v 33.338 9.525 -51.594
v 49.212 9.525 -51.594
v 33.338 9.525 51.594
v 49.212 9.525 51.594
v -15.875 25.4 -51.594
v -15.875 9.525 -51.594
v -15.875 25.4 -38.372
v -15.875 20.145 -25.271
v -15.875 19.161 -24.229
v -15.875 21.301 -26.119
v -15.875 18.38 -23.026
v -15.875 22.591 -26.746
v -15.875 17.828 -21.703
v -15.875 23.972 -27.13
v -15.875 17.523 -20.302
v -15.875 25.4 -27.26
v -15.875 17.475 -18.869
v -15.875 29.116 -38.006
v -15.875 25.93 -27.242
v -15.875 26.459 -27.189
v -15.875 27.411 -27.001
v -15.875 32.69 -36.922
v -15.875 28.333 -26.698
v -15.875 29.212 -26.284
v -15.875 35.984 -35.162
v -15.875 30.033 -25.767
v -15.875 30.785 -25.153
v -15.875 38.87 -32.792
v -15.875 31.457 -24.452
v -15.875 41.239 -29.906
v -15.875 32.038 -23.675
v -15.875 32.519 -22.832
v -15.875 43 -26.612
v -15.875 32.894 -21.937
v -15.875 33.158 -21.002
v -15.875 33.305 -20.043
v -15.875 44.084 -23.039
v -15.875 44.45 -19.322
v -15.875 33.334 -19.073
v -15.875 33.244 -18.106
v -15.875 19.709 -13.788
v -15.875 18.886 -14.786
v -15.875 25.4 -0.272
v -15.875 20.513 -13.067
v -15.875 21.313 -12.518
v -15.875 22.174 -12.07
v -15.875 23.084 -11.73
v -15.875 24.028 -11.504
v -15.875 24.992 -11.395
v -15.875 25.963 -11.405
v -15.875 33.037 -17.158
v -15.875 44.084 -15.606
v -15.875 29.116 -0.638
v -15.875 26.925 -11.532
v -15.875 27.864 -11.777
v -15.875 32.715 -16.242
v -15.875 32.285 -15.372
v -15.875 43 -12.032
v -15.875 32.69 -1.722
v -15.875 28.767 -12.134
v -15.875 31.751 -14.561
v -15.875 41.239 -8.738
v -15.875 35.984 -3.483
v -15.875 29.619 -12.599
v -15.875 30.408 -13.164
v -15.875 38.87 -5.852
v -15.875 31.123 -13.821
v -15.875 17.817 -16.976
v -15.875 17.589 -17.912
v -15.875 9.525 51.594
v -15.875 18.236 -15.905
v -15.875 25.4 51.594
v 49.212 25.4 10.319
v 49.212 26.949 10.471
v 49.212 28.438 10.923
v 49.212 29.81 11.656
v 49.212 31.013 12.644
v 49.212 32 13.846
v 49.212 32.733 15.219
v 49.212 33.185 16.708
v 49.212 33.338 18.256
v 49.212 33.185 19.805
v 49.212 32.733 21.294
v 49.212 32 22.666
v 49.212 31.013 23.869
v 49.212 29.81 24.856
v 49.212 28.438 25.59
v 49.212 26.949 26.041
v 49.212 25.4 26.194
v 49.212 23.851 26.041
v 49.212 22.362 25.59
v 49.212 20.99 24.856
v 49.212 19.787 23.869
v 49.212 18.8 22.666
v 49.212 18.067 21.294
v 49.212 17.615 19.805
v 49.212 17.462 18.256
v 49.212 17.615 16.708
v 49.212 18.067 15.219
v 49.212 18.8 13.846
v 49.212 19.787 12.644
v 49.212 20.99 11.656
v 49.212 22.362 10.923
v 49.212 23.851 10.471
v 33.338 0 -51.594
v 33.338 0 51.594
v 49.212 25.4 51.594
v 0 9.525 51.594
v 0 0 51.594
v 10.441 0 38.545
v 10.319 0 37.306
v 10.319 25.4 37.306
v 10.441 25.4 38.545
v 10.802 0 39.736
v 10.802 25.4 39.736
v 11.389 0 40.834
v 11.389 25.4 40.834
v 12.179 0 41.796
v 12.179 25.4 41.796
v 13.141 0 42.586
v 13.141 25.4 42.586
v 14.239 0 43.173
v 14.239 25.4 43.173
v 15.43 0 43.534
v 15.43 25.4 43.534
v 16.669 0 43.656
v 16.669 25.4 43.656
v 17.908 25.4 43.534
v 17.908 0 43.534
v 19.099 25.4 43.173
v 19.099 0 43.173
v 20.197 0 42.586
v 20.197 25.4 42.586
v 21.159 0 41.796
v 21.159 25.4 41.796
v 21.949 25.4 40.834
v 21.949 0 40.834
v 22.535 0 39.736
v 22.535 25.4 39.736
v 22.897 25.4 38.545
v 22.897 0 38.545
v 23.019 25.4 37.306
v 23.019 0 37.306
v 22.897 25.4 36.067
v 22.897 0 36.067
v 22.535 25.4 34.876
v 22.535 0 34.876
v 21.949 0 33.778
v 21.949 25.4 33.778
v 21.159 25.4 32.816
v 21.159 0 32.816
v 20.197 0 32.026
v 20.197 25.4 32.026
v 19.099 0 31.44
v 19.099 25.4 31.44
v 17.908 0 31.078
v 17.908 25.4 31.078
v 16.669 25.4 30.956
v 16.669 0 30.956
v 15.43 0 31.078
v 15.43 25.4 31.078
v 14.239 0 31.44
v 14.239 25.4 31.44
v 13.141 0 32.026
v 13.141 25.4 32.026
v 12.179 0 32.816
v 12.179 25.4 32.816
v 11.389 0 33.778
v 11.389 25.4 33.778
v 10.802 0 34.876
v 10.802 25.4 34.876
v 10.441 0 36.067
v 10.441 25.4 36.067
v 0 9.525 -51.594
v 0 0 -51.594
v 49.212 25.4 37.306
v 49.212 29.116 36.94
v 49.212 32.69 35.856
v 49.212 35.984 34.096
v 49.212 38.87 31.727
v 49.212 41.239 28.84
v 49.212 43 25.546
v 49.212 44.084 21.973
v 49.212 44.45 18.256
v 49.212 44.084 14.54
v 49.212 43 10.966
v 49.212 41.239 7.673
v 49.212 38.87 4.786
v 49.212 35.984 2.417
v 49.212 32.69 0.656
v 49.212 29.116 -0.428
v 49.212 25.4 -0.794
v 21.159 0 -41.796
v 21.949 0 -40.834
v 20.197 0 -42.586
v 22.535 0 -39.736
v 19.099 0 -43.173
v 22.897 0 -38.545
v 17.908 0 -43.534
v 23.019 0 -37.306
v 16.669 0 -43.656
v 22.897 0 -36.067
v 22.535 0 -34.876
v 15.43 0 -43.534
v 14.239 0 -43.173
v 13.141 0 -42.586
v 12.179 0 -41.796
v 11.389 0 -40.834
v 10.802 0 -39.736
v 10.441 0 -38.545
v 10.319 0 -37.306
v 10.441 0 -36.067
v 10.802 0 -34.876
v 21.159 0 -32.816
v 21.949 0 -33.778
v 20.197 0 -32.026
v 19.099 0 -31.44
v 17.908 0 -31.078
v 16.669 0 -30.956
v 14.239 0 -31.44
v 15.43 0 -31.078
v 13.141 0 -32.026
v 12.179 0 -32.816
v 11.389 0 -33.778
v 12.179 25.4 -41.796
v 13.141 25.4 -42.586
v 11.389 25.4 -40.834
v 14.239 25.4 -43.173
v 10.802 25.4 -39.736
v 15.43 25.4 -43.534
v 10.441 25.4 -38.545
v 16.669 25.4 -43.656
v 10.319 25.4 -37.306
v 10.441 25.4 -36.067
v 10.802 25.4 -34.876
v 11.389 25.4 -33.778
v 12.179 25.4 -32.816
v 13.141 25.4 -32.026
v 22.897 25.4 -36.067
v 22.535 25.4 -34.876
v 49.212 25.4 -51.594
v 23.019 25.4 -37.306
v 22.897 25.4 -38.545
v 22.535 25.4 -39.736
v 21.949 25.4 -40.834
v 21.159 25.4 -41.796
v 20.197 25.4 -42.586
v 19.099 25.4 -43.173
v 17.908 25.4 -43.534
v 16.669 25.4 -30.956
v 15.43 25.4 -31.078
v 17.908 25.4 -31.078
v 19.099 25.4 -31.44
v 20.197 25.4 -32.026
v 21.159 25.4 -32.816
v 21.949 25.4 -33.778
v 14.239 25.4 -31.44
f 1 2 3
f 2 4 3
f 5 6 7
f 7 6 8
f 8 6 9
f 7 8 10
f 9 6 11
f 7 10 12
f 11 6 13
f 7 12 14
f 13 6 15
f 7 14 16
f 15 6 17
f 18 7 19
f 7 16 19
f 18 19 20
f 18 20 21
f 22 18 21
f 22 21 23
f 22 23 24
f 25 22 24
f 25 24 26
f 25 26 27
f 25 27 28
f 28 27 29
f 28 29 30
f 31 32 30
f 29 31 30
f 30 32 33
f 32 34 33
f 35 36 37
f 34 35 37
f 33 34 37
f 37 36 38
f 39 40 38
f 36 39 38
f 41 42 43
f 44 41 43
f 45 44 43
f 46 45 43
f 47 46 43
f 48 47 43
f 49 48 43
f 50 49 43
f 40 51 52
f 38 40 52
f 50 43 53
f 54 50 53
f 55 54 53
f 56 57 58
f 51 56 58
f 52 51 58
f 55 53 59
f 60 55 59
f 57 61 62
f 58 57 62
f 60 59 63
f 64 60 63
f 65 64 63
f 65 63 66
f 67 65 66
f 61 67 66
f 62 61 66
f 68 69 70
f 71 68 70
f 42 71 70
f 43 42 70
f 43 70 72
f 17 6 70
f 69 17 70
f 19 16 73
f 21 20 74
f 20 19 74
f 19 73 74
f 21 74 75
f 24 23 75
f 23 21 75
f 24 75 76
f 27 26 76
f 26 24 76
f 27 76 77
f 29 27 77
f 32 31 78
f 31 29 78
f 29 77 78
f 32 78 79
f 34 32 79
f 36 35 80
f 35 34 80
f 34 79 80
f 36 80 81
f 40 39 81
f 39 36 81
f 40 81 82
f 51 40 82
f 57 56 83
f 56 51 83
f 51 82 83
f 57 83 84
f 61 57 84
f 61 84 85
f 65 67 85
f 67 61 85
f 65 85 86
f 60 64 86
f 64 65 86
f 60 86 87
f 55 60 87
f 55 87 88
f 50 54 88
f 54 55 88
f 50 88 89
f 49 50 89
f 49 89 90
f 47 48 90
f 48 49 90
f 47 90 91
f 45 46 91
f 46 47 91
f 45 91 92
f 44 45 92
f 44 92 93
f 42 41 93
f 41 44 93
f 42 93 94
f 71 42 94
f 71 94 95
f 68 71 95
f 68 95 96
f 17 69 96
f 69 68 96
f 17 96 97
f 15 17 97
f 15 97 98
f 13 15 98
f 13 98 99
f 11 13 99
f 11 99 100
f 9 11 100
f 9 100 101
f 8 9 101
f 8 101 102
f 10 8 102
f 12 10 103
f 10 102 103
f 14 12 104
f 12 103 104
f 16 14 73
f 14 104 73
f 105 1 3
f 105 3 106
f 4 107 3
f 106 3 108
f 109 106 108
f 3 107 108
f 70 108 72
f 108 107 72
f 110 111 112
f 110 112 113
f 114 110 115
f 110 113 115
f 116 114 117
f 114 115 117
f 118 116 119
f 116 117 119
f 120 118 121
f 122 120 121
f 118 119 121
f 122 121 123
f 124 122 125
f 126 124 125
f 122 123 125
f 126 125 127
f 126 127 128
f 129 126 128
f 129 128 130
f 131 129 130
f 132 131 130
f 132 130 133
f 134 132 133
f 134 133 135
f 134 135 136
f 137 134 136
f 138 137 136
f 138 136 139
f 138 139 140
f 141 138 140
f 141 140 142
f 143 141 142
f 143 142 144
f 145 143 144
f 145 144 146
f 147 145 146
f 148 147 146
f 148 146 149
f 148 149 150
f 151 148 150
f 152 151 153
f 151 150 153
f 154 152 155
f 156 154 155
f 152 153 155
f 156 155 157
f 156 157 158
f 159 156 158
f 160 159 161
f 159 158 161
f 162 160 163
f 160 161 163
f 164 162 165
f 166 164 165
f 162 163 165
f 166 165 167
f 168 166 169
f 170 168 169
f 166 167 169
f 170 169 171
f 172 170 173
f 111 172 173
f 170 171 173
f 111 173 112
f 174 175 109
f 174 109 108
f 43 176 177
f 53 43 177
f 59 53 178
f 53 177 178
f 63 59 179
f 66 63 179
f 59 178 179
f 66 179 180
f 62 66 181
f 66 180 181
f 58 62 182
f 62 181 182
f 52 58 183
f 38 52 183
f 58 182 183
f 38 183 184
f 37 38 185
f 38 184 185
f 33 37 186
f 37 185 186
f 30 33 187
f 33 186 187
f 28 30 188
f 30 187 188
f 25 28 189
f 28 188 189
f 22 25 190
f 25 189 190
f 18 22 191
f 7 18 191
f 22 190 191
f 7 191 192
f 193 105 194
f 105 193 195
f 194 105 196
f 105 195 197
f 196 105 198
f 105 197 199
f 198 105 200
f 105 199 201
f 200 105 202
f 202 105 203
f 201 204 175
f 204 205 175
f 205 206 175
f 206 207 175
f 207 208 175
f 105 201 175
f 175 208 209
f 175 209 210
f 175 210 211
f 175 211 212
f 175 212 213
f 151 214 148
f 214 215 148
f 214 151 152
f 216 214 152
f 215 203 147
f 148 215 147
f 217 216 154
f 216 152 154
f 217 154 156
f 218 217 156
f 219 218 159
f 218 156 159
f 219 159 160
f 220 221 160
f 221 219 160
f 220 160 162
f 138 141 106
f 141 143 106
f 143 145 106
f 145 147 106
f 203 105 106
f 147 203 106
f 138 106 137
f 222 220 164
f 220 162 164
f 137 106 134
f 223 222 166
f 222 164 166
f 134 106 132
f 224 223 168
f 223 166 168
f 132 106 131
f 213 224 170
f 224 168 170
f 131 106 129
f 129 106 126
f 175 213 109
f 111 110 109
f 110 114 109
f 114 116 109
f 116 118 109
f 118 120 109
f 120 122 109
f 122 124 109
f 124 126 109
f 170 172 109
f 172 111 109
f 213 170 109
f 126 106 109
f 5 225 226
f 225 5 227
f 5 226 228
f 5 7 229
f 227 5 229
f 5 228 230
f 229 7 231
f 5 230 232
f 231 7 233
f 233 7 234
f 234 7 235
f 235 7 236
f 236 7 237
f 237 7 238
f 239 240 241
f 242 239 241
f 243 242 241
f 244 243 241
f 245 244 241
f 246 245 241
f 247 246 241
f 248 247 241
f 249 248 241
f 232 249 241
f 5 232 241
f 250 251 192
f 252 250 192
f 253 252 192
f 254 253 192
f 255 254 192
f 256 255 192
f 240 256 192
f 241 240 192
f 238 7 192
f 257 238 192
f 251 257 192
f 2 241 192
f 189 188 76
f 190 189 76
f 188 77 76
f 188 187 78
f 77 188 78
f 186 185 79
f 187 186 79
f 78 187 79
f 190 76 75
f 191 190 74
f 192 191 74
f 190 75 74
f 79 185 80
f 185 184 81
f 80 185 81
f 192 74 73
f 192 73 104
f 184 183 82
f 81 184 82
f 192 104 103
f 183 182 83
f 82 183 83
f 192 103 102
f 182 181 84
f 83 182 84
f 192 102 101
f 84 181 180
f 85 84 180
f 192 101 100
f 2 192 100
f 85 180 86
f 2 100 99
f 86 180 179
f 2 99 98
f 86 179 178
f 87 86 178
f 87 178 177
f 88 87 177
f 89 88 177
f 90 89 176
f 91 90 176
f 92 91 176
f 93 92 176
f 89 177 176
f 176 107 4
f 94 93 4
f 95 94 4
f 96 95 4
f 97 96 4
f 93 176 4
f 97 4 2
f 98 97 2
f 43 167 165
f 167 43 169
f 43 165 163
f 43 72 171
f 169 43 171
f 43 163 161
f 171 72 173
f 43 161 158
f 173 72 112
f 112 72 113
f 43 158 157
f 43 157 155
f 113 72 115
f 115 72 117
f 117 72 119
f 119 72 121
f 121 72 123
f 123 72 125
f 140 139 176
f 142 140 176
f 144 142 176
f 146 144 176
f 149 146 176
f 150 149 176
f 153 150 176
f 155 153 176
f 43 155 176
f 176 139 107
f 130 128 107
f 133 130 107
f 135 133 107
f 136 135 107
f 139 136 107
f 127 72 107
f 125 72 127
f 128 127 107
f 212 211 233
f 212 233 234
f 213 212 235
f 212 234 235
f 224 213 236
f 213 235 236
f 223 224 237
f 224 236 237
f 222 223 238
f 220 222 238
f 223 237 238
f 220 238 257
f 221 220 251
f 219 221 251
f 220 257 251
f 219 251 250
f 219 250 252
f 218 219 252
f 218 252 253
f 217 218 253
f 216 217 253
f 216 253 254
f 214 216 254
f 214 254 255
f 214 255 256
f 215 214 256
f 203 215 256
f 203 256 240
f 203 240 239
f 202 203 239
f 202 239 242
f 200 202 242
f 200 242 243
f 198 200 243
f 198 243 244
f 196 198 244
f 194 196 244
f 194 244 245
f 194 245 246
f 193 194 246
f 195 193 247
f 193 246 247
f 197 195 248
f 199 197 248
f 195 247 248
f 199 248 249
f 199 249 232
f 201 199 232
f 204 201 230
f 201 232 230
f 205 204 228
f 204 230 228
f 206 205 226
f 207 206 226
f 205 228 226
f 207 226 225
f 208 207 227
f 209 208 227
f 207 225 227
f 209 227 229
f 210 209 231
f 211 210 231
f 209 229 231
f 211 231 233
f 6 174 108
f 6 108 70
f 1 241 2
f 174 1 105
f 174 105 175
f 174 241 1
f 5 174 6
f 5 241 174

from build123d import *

# Parameters (mm, degrees)
BOSS_EXTRUDE1_DEPTH = 51.59375
BOSS_EXTRUDE2_DEPTH = 75.156571292
SKETCH5_R           = 7.9375
CUT_EXTRUDE1_DEPTH  = 109.930311747
SKETCH6_R           = 6.35
CUT_EXTRUDE2_DEPTH  = 76.68979598


with BuildPart() as part:
    # Sketch2 → Boss-Extrude1 (new, symmetric)
    with BuildSketch(Plane.XY):
        Polygon((0, 9.525), (-15.875, 9.525), (-15.875, 25.4), (49.2125, 25.4), (49.2125, 9.525), (33.3375, 9.525), (33.3375, 0), (0, 0), align=None)
    extrude(amount=BOSS_EXTRUDE1_DEPTH, both=True)

    # Sketch3 → Boss-Extrude2 (add, along a direction that is not the sketch's normal)
    with BuildSketch(Plane(origin=(49.2125, 0, 0), x_dir=(0, 0, -1), z_dir=(1, 0, 0))):
        with BuildLine():
            Line((0.79375, 25.4), (-37.30625, 25.4))
            ThreePointArc((-37.30625, 25.4), (-18.25625, 44.45), (0.79375, 25.4))
        make_face()
    extrude(amount=-BOSS_EXTRUDE2_DEPTH, dir=(0.86602540378444, 0, 0.49999999999999767))

    # Sketch5 → Cut-Extrude1 (cut, through all, along a direction that is not the sketch's normal)
    with BuildSketch(Plane(origin=(49.2125, 0, 0), x_dir=(0, 0, -1), z_dir=(1, 0, 0))):
        with Locations((-18.25625, 25.4)):
            Circle(SKETCH5_R)
    extrude(amount=-CUT_EXTRUDE1_DEPTH, dir=(0.86602540378444, 0, 0.49999999999999767), mode=Mode.SUBTRACT)

    # Sketch6 → Cut-Extrude2 (cut, through all)
    with BuildSketch(Plane(origin=(0, 25.4, 0), x_dir=(1, 0, 0), z_dir=(0, 1, 0))):
        with Locations(Location((16.66875, -37.30625, 0), (0, 0, 180))):
            Circle(SKETCH6_R)
        with Locations(Location((16.66875, 37.30625, 0), (0, 0, 180))):
            Circle(SKETCH6_R)
    extrude(amount=-CUT_EXTRUDE2_DEPTH, mode=Mode.SUBTRACT)


solid = part.part
